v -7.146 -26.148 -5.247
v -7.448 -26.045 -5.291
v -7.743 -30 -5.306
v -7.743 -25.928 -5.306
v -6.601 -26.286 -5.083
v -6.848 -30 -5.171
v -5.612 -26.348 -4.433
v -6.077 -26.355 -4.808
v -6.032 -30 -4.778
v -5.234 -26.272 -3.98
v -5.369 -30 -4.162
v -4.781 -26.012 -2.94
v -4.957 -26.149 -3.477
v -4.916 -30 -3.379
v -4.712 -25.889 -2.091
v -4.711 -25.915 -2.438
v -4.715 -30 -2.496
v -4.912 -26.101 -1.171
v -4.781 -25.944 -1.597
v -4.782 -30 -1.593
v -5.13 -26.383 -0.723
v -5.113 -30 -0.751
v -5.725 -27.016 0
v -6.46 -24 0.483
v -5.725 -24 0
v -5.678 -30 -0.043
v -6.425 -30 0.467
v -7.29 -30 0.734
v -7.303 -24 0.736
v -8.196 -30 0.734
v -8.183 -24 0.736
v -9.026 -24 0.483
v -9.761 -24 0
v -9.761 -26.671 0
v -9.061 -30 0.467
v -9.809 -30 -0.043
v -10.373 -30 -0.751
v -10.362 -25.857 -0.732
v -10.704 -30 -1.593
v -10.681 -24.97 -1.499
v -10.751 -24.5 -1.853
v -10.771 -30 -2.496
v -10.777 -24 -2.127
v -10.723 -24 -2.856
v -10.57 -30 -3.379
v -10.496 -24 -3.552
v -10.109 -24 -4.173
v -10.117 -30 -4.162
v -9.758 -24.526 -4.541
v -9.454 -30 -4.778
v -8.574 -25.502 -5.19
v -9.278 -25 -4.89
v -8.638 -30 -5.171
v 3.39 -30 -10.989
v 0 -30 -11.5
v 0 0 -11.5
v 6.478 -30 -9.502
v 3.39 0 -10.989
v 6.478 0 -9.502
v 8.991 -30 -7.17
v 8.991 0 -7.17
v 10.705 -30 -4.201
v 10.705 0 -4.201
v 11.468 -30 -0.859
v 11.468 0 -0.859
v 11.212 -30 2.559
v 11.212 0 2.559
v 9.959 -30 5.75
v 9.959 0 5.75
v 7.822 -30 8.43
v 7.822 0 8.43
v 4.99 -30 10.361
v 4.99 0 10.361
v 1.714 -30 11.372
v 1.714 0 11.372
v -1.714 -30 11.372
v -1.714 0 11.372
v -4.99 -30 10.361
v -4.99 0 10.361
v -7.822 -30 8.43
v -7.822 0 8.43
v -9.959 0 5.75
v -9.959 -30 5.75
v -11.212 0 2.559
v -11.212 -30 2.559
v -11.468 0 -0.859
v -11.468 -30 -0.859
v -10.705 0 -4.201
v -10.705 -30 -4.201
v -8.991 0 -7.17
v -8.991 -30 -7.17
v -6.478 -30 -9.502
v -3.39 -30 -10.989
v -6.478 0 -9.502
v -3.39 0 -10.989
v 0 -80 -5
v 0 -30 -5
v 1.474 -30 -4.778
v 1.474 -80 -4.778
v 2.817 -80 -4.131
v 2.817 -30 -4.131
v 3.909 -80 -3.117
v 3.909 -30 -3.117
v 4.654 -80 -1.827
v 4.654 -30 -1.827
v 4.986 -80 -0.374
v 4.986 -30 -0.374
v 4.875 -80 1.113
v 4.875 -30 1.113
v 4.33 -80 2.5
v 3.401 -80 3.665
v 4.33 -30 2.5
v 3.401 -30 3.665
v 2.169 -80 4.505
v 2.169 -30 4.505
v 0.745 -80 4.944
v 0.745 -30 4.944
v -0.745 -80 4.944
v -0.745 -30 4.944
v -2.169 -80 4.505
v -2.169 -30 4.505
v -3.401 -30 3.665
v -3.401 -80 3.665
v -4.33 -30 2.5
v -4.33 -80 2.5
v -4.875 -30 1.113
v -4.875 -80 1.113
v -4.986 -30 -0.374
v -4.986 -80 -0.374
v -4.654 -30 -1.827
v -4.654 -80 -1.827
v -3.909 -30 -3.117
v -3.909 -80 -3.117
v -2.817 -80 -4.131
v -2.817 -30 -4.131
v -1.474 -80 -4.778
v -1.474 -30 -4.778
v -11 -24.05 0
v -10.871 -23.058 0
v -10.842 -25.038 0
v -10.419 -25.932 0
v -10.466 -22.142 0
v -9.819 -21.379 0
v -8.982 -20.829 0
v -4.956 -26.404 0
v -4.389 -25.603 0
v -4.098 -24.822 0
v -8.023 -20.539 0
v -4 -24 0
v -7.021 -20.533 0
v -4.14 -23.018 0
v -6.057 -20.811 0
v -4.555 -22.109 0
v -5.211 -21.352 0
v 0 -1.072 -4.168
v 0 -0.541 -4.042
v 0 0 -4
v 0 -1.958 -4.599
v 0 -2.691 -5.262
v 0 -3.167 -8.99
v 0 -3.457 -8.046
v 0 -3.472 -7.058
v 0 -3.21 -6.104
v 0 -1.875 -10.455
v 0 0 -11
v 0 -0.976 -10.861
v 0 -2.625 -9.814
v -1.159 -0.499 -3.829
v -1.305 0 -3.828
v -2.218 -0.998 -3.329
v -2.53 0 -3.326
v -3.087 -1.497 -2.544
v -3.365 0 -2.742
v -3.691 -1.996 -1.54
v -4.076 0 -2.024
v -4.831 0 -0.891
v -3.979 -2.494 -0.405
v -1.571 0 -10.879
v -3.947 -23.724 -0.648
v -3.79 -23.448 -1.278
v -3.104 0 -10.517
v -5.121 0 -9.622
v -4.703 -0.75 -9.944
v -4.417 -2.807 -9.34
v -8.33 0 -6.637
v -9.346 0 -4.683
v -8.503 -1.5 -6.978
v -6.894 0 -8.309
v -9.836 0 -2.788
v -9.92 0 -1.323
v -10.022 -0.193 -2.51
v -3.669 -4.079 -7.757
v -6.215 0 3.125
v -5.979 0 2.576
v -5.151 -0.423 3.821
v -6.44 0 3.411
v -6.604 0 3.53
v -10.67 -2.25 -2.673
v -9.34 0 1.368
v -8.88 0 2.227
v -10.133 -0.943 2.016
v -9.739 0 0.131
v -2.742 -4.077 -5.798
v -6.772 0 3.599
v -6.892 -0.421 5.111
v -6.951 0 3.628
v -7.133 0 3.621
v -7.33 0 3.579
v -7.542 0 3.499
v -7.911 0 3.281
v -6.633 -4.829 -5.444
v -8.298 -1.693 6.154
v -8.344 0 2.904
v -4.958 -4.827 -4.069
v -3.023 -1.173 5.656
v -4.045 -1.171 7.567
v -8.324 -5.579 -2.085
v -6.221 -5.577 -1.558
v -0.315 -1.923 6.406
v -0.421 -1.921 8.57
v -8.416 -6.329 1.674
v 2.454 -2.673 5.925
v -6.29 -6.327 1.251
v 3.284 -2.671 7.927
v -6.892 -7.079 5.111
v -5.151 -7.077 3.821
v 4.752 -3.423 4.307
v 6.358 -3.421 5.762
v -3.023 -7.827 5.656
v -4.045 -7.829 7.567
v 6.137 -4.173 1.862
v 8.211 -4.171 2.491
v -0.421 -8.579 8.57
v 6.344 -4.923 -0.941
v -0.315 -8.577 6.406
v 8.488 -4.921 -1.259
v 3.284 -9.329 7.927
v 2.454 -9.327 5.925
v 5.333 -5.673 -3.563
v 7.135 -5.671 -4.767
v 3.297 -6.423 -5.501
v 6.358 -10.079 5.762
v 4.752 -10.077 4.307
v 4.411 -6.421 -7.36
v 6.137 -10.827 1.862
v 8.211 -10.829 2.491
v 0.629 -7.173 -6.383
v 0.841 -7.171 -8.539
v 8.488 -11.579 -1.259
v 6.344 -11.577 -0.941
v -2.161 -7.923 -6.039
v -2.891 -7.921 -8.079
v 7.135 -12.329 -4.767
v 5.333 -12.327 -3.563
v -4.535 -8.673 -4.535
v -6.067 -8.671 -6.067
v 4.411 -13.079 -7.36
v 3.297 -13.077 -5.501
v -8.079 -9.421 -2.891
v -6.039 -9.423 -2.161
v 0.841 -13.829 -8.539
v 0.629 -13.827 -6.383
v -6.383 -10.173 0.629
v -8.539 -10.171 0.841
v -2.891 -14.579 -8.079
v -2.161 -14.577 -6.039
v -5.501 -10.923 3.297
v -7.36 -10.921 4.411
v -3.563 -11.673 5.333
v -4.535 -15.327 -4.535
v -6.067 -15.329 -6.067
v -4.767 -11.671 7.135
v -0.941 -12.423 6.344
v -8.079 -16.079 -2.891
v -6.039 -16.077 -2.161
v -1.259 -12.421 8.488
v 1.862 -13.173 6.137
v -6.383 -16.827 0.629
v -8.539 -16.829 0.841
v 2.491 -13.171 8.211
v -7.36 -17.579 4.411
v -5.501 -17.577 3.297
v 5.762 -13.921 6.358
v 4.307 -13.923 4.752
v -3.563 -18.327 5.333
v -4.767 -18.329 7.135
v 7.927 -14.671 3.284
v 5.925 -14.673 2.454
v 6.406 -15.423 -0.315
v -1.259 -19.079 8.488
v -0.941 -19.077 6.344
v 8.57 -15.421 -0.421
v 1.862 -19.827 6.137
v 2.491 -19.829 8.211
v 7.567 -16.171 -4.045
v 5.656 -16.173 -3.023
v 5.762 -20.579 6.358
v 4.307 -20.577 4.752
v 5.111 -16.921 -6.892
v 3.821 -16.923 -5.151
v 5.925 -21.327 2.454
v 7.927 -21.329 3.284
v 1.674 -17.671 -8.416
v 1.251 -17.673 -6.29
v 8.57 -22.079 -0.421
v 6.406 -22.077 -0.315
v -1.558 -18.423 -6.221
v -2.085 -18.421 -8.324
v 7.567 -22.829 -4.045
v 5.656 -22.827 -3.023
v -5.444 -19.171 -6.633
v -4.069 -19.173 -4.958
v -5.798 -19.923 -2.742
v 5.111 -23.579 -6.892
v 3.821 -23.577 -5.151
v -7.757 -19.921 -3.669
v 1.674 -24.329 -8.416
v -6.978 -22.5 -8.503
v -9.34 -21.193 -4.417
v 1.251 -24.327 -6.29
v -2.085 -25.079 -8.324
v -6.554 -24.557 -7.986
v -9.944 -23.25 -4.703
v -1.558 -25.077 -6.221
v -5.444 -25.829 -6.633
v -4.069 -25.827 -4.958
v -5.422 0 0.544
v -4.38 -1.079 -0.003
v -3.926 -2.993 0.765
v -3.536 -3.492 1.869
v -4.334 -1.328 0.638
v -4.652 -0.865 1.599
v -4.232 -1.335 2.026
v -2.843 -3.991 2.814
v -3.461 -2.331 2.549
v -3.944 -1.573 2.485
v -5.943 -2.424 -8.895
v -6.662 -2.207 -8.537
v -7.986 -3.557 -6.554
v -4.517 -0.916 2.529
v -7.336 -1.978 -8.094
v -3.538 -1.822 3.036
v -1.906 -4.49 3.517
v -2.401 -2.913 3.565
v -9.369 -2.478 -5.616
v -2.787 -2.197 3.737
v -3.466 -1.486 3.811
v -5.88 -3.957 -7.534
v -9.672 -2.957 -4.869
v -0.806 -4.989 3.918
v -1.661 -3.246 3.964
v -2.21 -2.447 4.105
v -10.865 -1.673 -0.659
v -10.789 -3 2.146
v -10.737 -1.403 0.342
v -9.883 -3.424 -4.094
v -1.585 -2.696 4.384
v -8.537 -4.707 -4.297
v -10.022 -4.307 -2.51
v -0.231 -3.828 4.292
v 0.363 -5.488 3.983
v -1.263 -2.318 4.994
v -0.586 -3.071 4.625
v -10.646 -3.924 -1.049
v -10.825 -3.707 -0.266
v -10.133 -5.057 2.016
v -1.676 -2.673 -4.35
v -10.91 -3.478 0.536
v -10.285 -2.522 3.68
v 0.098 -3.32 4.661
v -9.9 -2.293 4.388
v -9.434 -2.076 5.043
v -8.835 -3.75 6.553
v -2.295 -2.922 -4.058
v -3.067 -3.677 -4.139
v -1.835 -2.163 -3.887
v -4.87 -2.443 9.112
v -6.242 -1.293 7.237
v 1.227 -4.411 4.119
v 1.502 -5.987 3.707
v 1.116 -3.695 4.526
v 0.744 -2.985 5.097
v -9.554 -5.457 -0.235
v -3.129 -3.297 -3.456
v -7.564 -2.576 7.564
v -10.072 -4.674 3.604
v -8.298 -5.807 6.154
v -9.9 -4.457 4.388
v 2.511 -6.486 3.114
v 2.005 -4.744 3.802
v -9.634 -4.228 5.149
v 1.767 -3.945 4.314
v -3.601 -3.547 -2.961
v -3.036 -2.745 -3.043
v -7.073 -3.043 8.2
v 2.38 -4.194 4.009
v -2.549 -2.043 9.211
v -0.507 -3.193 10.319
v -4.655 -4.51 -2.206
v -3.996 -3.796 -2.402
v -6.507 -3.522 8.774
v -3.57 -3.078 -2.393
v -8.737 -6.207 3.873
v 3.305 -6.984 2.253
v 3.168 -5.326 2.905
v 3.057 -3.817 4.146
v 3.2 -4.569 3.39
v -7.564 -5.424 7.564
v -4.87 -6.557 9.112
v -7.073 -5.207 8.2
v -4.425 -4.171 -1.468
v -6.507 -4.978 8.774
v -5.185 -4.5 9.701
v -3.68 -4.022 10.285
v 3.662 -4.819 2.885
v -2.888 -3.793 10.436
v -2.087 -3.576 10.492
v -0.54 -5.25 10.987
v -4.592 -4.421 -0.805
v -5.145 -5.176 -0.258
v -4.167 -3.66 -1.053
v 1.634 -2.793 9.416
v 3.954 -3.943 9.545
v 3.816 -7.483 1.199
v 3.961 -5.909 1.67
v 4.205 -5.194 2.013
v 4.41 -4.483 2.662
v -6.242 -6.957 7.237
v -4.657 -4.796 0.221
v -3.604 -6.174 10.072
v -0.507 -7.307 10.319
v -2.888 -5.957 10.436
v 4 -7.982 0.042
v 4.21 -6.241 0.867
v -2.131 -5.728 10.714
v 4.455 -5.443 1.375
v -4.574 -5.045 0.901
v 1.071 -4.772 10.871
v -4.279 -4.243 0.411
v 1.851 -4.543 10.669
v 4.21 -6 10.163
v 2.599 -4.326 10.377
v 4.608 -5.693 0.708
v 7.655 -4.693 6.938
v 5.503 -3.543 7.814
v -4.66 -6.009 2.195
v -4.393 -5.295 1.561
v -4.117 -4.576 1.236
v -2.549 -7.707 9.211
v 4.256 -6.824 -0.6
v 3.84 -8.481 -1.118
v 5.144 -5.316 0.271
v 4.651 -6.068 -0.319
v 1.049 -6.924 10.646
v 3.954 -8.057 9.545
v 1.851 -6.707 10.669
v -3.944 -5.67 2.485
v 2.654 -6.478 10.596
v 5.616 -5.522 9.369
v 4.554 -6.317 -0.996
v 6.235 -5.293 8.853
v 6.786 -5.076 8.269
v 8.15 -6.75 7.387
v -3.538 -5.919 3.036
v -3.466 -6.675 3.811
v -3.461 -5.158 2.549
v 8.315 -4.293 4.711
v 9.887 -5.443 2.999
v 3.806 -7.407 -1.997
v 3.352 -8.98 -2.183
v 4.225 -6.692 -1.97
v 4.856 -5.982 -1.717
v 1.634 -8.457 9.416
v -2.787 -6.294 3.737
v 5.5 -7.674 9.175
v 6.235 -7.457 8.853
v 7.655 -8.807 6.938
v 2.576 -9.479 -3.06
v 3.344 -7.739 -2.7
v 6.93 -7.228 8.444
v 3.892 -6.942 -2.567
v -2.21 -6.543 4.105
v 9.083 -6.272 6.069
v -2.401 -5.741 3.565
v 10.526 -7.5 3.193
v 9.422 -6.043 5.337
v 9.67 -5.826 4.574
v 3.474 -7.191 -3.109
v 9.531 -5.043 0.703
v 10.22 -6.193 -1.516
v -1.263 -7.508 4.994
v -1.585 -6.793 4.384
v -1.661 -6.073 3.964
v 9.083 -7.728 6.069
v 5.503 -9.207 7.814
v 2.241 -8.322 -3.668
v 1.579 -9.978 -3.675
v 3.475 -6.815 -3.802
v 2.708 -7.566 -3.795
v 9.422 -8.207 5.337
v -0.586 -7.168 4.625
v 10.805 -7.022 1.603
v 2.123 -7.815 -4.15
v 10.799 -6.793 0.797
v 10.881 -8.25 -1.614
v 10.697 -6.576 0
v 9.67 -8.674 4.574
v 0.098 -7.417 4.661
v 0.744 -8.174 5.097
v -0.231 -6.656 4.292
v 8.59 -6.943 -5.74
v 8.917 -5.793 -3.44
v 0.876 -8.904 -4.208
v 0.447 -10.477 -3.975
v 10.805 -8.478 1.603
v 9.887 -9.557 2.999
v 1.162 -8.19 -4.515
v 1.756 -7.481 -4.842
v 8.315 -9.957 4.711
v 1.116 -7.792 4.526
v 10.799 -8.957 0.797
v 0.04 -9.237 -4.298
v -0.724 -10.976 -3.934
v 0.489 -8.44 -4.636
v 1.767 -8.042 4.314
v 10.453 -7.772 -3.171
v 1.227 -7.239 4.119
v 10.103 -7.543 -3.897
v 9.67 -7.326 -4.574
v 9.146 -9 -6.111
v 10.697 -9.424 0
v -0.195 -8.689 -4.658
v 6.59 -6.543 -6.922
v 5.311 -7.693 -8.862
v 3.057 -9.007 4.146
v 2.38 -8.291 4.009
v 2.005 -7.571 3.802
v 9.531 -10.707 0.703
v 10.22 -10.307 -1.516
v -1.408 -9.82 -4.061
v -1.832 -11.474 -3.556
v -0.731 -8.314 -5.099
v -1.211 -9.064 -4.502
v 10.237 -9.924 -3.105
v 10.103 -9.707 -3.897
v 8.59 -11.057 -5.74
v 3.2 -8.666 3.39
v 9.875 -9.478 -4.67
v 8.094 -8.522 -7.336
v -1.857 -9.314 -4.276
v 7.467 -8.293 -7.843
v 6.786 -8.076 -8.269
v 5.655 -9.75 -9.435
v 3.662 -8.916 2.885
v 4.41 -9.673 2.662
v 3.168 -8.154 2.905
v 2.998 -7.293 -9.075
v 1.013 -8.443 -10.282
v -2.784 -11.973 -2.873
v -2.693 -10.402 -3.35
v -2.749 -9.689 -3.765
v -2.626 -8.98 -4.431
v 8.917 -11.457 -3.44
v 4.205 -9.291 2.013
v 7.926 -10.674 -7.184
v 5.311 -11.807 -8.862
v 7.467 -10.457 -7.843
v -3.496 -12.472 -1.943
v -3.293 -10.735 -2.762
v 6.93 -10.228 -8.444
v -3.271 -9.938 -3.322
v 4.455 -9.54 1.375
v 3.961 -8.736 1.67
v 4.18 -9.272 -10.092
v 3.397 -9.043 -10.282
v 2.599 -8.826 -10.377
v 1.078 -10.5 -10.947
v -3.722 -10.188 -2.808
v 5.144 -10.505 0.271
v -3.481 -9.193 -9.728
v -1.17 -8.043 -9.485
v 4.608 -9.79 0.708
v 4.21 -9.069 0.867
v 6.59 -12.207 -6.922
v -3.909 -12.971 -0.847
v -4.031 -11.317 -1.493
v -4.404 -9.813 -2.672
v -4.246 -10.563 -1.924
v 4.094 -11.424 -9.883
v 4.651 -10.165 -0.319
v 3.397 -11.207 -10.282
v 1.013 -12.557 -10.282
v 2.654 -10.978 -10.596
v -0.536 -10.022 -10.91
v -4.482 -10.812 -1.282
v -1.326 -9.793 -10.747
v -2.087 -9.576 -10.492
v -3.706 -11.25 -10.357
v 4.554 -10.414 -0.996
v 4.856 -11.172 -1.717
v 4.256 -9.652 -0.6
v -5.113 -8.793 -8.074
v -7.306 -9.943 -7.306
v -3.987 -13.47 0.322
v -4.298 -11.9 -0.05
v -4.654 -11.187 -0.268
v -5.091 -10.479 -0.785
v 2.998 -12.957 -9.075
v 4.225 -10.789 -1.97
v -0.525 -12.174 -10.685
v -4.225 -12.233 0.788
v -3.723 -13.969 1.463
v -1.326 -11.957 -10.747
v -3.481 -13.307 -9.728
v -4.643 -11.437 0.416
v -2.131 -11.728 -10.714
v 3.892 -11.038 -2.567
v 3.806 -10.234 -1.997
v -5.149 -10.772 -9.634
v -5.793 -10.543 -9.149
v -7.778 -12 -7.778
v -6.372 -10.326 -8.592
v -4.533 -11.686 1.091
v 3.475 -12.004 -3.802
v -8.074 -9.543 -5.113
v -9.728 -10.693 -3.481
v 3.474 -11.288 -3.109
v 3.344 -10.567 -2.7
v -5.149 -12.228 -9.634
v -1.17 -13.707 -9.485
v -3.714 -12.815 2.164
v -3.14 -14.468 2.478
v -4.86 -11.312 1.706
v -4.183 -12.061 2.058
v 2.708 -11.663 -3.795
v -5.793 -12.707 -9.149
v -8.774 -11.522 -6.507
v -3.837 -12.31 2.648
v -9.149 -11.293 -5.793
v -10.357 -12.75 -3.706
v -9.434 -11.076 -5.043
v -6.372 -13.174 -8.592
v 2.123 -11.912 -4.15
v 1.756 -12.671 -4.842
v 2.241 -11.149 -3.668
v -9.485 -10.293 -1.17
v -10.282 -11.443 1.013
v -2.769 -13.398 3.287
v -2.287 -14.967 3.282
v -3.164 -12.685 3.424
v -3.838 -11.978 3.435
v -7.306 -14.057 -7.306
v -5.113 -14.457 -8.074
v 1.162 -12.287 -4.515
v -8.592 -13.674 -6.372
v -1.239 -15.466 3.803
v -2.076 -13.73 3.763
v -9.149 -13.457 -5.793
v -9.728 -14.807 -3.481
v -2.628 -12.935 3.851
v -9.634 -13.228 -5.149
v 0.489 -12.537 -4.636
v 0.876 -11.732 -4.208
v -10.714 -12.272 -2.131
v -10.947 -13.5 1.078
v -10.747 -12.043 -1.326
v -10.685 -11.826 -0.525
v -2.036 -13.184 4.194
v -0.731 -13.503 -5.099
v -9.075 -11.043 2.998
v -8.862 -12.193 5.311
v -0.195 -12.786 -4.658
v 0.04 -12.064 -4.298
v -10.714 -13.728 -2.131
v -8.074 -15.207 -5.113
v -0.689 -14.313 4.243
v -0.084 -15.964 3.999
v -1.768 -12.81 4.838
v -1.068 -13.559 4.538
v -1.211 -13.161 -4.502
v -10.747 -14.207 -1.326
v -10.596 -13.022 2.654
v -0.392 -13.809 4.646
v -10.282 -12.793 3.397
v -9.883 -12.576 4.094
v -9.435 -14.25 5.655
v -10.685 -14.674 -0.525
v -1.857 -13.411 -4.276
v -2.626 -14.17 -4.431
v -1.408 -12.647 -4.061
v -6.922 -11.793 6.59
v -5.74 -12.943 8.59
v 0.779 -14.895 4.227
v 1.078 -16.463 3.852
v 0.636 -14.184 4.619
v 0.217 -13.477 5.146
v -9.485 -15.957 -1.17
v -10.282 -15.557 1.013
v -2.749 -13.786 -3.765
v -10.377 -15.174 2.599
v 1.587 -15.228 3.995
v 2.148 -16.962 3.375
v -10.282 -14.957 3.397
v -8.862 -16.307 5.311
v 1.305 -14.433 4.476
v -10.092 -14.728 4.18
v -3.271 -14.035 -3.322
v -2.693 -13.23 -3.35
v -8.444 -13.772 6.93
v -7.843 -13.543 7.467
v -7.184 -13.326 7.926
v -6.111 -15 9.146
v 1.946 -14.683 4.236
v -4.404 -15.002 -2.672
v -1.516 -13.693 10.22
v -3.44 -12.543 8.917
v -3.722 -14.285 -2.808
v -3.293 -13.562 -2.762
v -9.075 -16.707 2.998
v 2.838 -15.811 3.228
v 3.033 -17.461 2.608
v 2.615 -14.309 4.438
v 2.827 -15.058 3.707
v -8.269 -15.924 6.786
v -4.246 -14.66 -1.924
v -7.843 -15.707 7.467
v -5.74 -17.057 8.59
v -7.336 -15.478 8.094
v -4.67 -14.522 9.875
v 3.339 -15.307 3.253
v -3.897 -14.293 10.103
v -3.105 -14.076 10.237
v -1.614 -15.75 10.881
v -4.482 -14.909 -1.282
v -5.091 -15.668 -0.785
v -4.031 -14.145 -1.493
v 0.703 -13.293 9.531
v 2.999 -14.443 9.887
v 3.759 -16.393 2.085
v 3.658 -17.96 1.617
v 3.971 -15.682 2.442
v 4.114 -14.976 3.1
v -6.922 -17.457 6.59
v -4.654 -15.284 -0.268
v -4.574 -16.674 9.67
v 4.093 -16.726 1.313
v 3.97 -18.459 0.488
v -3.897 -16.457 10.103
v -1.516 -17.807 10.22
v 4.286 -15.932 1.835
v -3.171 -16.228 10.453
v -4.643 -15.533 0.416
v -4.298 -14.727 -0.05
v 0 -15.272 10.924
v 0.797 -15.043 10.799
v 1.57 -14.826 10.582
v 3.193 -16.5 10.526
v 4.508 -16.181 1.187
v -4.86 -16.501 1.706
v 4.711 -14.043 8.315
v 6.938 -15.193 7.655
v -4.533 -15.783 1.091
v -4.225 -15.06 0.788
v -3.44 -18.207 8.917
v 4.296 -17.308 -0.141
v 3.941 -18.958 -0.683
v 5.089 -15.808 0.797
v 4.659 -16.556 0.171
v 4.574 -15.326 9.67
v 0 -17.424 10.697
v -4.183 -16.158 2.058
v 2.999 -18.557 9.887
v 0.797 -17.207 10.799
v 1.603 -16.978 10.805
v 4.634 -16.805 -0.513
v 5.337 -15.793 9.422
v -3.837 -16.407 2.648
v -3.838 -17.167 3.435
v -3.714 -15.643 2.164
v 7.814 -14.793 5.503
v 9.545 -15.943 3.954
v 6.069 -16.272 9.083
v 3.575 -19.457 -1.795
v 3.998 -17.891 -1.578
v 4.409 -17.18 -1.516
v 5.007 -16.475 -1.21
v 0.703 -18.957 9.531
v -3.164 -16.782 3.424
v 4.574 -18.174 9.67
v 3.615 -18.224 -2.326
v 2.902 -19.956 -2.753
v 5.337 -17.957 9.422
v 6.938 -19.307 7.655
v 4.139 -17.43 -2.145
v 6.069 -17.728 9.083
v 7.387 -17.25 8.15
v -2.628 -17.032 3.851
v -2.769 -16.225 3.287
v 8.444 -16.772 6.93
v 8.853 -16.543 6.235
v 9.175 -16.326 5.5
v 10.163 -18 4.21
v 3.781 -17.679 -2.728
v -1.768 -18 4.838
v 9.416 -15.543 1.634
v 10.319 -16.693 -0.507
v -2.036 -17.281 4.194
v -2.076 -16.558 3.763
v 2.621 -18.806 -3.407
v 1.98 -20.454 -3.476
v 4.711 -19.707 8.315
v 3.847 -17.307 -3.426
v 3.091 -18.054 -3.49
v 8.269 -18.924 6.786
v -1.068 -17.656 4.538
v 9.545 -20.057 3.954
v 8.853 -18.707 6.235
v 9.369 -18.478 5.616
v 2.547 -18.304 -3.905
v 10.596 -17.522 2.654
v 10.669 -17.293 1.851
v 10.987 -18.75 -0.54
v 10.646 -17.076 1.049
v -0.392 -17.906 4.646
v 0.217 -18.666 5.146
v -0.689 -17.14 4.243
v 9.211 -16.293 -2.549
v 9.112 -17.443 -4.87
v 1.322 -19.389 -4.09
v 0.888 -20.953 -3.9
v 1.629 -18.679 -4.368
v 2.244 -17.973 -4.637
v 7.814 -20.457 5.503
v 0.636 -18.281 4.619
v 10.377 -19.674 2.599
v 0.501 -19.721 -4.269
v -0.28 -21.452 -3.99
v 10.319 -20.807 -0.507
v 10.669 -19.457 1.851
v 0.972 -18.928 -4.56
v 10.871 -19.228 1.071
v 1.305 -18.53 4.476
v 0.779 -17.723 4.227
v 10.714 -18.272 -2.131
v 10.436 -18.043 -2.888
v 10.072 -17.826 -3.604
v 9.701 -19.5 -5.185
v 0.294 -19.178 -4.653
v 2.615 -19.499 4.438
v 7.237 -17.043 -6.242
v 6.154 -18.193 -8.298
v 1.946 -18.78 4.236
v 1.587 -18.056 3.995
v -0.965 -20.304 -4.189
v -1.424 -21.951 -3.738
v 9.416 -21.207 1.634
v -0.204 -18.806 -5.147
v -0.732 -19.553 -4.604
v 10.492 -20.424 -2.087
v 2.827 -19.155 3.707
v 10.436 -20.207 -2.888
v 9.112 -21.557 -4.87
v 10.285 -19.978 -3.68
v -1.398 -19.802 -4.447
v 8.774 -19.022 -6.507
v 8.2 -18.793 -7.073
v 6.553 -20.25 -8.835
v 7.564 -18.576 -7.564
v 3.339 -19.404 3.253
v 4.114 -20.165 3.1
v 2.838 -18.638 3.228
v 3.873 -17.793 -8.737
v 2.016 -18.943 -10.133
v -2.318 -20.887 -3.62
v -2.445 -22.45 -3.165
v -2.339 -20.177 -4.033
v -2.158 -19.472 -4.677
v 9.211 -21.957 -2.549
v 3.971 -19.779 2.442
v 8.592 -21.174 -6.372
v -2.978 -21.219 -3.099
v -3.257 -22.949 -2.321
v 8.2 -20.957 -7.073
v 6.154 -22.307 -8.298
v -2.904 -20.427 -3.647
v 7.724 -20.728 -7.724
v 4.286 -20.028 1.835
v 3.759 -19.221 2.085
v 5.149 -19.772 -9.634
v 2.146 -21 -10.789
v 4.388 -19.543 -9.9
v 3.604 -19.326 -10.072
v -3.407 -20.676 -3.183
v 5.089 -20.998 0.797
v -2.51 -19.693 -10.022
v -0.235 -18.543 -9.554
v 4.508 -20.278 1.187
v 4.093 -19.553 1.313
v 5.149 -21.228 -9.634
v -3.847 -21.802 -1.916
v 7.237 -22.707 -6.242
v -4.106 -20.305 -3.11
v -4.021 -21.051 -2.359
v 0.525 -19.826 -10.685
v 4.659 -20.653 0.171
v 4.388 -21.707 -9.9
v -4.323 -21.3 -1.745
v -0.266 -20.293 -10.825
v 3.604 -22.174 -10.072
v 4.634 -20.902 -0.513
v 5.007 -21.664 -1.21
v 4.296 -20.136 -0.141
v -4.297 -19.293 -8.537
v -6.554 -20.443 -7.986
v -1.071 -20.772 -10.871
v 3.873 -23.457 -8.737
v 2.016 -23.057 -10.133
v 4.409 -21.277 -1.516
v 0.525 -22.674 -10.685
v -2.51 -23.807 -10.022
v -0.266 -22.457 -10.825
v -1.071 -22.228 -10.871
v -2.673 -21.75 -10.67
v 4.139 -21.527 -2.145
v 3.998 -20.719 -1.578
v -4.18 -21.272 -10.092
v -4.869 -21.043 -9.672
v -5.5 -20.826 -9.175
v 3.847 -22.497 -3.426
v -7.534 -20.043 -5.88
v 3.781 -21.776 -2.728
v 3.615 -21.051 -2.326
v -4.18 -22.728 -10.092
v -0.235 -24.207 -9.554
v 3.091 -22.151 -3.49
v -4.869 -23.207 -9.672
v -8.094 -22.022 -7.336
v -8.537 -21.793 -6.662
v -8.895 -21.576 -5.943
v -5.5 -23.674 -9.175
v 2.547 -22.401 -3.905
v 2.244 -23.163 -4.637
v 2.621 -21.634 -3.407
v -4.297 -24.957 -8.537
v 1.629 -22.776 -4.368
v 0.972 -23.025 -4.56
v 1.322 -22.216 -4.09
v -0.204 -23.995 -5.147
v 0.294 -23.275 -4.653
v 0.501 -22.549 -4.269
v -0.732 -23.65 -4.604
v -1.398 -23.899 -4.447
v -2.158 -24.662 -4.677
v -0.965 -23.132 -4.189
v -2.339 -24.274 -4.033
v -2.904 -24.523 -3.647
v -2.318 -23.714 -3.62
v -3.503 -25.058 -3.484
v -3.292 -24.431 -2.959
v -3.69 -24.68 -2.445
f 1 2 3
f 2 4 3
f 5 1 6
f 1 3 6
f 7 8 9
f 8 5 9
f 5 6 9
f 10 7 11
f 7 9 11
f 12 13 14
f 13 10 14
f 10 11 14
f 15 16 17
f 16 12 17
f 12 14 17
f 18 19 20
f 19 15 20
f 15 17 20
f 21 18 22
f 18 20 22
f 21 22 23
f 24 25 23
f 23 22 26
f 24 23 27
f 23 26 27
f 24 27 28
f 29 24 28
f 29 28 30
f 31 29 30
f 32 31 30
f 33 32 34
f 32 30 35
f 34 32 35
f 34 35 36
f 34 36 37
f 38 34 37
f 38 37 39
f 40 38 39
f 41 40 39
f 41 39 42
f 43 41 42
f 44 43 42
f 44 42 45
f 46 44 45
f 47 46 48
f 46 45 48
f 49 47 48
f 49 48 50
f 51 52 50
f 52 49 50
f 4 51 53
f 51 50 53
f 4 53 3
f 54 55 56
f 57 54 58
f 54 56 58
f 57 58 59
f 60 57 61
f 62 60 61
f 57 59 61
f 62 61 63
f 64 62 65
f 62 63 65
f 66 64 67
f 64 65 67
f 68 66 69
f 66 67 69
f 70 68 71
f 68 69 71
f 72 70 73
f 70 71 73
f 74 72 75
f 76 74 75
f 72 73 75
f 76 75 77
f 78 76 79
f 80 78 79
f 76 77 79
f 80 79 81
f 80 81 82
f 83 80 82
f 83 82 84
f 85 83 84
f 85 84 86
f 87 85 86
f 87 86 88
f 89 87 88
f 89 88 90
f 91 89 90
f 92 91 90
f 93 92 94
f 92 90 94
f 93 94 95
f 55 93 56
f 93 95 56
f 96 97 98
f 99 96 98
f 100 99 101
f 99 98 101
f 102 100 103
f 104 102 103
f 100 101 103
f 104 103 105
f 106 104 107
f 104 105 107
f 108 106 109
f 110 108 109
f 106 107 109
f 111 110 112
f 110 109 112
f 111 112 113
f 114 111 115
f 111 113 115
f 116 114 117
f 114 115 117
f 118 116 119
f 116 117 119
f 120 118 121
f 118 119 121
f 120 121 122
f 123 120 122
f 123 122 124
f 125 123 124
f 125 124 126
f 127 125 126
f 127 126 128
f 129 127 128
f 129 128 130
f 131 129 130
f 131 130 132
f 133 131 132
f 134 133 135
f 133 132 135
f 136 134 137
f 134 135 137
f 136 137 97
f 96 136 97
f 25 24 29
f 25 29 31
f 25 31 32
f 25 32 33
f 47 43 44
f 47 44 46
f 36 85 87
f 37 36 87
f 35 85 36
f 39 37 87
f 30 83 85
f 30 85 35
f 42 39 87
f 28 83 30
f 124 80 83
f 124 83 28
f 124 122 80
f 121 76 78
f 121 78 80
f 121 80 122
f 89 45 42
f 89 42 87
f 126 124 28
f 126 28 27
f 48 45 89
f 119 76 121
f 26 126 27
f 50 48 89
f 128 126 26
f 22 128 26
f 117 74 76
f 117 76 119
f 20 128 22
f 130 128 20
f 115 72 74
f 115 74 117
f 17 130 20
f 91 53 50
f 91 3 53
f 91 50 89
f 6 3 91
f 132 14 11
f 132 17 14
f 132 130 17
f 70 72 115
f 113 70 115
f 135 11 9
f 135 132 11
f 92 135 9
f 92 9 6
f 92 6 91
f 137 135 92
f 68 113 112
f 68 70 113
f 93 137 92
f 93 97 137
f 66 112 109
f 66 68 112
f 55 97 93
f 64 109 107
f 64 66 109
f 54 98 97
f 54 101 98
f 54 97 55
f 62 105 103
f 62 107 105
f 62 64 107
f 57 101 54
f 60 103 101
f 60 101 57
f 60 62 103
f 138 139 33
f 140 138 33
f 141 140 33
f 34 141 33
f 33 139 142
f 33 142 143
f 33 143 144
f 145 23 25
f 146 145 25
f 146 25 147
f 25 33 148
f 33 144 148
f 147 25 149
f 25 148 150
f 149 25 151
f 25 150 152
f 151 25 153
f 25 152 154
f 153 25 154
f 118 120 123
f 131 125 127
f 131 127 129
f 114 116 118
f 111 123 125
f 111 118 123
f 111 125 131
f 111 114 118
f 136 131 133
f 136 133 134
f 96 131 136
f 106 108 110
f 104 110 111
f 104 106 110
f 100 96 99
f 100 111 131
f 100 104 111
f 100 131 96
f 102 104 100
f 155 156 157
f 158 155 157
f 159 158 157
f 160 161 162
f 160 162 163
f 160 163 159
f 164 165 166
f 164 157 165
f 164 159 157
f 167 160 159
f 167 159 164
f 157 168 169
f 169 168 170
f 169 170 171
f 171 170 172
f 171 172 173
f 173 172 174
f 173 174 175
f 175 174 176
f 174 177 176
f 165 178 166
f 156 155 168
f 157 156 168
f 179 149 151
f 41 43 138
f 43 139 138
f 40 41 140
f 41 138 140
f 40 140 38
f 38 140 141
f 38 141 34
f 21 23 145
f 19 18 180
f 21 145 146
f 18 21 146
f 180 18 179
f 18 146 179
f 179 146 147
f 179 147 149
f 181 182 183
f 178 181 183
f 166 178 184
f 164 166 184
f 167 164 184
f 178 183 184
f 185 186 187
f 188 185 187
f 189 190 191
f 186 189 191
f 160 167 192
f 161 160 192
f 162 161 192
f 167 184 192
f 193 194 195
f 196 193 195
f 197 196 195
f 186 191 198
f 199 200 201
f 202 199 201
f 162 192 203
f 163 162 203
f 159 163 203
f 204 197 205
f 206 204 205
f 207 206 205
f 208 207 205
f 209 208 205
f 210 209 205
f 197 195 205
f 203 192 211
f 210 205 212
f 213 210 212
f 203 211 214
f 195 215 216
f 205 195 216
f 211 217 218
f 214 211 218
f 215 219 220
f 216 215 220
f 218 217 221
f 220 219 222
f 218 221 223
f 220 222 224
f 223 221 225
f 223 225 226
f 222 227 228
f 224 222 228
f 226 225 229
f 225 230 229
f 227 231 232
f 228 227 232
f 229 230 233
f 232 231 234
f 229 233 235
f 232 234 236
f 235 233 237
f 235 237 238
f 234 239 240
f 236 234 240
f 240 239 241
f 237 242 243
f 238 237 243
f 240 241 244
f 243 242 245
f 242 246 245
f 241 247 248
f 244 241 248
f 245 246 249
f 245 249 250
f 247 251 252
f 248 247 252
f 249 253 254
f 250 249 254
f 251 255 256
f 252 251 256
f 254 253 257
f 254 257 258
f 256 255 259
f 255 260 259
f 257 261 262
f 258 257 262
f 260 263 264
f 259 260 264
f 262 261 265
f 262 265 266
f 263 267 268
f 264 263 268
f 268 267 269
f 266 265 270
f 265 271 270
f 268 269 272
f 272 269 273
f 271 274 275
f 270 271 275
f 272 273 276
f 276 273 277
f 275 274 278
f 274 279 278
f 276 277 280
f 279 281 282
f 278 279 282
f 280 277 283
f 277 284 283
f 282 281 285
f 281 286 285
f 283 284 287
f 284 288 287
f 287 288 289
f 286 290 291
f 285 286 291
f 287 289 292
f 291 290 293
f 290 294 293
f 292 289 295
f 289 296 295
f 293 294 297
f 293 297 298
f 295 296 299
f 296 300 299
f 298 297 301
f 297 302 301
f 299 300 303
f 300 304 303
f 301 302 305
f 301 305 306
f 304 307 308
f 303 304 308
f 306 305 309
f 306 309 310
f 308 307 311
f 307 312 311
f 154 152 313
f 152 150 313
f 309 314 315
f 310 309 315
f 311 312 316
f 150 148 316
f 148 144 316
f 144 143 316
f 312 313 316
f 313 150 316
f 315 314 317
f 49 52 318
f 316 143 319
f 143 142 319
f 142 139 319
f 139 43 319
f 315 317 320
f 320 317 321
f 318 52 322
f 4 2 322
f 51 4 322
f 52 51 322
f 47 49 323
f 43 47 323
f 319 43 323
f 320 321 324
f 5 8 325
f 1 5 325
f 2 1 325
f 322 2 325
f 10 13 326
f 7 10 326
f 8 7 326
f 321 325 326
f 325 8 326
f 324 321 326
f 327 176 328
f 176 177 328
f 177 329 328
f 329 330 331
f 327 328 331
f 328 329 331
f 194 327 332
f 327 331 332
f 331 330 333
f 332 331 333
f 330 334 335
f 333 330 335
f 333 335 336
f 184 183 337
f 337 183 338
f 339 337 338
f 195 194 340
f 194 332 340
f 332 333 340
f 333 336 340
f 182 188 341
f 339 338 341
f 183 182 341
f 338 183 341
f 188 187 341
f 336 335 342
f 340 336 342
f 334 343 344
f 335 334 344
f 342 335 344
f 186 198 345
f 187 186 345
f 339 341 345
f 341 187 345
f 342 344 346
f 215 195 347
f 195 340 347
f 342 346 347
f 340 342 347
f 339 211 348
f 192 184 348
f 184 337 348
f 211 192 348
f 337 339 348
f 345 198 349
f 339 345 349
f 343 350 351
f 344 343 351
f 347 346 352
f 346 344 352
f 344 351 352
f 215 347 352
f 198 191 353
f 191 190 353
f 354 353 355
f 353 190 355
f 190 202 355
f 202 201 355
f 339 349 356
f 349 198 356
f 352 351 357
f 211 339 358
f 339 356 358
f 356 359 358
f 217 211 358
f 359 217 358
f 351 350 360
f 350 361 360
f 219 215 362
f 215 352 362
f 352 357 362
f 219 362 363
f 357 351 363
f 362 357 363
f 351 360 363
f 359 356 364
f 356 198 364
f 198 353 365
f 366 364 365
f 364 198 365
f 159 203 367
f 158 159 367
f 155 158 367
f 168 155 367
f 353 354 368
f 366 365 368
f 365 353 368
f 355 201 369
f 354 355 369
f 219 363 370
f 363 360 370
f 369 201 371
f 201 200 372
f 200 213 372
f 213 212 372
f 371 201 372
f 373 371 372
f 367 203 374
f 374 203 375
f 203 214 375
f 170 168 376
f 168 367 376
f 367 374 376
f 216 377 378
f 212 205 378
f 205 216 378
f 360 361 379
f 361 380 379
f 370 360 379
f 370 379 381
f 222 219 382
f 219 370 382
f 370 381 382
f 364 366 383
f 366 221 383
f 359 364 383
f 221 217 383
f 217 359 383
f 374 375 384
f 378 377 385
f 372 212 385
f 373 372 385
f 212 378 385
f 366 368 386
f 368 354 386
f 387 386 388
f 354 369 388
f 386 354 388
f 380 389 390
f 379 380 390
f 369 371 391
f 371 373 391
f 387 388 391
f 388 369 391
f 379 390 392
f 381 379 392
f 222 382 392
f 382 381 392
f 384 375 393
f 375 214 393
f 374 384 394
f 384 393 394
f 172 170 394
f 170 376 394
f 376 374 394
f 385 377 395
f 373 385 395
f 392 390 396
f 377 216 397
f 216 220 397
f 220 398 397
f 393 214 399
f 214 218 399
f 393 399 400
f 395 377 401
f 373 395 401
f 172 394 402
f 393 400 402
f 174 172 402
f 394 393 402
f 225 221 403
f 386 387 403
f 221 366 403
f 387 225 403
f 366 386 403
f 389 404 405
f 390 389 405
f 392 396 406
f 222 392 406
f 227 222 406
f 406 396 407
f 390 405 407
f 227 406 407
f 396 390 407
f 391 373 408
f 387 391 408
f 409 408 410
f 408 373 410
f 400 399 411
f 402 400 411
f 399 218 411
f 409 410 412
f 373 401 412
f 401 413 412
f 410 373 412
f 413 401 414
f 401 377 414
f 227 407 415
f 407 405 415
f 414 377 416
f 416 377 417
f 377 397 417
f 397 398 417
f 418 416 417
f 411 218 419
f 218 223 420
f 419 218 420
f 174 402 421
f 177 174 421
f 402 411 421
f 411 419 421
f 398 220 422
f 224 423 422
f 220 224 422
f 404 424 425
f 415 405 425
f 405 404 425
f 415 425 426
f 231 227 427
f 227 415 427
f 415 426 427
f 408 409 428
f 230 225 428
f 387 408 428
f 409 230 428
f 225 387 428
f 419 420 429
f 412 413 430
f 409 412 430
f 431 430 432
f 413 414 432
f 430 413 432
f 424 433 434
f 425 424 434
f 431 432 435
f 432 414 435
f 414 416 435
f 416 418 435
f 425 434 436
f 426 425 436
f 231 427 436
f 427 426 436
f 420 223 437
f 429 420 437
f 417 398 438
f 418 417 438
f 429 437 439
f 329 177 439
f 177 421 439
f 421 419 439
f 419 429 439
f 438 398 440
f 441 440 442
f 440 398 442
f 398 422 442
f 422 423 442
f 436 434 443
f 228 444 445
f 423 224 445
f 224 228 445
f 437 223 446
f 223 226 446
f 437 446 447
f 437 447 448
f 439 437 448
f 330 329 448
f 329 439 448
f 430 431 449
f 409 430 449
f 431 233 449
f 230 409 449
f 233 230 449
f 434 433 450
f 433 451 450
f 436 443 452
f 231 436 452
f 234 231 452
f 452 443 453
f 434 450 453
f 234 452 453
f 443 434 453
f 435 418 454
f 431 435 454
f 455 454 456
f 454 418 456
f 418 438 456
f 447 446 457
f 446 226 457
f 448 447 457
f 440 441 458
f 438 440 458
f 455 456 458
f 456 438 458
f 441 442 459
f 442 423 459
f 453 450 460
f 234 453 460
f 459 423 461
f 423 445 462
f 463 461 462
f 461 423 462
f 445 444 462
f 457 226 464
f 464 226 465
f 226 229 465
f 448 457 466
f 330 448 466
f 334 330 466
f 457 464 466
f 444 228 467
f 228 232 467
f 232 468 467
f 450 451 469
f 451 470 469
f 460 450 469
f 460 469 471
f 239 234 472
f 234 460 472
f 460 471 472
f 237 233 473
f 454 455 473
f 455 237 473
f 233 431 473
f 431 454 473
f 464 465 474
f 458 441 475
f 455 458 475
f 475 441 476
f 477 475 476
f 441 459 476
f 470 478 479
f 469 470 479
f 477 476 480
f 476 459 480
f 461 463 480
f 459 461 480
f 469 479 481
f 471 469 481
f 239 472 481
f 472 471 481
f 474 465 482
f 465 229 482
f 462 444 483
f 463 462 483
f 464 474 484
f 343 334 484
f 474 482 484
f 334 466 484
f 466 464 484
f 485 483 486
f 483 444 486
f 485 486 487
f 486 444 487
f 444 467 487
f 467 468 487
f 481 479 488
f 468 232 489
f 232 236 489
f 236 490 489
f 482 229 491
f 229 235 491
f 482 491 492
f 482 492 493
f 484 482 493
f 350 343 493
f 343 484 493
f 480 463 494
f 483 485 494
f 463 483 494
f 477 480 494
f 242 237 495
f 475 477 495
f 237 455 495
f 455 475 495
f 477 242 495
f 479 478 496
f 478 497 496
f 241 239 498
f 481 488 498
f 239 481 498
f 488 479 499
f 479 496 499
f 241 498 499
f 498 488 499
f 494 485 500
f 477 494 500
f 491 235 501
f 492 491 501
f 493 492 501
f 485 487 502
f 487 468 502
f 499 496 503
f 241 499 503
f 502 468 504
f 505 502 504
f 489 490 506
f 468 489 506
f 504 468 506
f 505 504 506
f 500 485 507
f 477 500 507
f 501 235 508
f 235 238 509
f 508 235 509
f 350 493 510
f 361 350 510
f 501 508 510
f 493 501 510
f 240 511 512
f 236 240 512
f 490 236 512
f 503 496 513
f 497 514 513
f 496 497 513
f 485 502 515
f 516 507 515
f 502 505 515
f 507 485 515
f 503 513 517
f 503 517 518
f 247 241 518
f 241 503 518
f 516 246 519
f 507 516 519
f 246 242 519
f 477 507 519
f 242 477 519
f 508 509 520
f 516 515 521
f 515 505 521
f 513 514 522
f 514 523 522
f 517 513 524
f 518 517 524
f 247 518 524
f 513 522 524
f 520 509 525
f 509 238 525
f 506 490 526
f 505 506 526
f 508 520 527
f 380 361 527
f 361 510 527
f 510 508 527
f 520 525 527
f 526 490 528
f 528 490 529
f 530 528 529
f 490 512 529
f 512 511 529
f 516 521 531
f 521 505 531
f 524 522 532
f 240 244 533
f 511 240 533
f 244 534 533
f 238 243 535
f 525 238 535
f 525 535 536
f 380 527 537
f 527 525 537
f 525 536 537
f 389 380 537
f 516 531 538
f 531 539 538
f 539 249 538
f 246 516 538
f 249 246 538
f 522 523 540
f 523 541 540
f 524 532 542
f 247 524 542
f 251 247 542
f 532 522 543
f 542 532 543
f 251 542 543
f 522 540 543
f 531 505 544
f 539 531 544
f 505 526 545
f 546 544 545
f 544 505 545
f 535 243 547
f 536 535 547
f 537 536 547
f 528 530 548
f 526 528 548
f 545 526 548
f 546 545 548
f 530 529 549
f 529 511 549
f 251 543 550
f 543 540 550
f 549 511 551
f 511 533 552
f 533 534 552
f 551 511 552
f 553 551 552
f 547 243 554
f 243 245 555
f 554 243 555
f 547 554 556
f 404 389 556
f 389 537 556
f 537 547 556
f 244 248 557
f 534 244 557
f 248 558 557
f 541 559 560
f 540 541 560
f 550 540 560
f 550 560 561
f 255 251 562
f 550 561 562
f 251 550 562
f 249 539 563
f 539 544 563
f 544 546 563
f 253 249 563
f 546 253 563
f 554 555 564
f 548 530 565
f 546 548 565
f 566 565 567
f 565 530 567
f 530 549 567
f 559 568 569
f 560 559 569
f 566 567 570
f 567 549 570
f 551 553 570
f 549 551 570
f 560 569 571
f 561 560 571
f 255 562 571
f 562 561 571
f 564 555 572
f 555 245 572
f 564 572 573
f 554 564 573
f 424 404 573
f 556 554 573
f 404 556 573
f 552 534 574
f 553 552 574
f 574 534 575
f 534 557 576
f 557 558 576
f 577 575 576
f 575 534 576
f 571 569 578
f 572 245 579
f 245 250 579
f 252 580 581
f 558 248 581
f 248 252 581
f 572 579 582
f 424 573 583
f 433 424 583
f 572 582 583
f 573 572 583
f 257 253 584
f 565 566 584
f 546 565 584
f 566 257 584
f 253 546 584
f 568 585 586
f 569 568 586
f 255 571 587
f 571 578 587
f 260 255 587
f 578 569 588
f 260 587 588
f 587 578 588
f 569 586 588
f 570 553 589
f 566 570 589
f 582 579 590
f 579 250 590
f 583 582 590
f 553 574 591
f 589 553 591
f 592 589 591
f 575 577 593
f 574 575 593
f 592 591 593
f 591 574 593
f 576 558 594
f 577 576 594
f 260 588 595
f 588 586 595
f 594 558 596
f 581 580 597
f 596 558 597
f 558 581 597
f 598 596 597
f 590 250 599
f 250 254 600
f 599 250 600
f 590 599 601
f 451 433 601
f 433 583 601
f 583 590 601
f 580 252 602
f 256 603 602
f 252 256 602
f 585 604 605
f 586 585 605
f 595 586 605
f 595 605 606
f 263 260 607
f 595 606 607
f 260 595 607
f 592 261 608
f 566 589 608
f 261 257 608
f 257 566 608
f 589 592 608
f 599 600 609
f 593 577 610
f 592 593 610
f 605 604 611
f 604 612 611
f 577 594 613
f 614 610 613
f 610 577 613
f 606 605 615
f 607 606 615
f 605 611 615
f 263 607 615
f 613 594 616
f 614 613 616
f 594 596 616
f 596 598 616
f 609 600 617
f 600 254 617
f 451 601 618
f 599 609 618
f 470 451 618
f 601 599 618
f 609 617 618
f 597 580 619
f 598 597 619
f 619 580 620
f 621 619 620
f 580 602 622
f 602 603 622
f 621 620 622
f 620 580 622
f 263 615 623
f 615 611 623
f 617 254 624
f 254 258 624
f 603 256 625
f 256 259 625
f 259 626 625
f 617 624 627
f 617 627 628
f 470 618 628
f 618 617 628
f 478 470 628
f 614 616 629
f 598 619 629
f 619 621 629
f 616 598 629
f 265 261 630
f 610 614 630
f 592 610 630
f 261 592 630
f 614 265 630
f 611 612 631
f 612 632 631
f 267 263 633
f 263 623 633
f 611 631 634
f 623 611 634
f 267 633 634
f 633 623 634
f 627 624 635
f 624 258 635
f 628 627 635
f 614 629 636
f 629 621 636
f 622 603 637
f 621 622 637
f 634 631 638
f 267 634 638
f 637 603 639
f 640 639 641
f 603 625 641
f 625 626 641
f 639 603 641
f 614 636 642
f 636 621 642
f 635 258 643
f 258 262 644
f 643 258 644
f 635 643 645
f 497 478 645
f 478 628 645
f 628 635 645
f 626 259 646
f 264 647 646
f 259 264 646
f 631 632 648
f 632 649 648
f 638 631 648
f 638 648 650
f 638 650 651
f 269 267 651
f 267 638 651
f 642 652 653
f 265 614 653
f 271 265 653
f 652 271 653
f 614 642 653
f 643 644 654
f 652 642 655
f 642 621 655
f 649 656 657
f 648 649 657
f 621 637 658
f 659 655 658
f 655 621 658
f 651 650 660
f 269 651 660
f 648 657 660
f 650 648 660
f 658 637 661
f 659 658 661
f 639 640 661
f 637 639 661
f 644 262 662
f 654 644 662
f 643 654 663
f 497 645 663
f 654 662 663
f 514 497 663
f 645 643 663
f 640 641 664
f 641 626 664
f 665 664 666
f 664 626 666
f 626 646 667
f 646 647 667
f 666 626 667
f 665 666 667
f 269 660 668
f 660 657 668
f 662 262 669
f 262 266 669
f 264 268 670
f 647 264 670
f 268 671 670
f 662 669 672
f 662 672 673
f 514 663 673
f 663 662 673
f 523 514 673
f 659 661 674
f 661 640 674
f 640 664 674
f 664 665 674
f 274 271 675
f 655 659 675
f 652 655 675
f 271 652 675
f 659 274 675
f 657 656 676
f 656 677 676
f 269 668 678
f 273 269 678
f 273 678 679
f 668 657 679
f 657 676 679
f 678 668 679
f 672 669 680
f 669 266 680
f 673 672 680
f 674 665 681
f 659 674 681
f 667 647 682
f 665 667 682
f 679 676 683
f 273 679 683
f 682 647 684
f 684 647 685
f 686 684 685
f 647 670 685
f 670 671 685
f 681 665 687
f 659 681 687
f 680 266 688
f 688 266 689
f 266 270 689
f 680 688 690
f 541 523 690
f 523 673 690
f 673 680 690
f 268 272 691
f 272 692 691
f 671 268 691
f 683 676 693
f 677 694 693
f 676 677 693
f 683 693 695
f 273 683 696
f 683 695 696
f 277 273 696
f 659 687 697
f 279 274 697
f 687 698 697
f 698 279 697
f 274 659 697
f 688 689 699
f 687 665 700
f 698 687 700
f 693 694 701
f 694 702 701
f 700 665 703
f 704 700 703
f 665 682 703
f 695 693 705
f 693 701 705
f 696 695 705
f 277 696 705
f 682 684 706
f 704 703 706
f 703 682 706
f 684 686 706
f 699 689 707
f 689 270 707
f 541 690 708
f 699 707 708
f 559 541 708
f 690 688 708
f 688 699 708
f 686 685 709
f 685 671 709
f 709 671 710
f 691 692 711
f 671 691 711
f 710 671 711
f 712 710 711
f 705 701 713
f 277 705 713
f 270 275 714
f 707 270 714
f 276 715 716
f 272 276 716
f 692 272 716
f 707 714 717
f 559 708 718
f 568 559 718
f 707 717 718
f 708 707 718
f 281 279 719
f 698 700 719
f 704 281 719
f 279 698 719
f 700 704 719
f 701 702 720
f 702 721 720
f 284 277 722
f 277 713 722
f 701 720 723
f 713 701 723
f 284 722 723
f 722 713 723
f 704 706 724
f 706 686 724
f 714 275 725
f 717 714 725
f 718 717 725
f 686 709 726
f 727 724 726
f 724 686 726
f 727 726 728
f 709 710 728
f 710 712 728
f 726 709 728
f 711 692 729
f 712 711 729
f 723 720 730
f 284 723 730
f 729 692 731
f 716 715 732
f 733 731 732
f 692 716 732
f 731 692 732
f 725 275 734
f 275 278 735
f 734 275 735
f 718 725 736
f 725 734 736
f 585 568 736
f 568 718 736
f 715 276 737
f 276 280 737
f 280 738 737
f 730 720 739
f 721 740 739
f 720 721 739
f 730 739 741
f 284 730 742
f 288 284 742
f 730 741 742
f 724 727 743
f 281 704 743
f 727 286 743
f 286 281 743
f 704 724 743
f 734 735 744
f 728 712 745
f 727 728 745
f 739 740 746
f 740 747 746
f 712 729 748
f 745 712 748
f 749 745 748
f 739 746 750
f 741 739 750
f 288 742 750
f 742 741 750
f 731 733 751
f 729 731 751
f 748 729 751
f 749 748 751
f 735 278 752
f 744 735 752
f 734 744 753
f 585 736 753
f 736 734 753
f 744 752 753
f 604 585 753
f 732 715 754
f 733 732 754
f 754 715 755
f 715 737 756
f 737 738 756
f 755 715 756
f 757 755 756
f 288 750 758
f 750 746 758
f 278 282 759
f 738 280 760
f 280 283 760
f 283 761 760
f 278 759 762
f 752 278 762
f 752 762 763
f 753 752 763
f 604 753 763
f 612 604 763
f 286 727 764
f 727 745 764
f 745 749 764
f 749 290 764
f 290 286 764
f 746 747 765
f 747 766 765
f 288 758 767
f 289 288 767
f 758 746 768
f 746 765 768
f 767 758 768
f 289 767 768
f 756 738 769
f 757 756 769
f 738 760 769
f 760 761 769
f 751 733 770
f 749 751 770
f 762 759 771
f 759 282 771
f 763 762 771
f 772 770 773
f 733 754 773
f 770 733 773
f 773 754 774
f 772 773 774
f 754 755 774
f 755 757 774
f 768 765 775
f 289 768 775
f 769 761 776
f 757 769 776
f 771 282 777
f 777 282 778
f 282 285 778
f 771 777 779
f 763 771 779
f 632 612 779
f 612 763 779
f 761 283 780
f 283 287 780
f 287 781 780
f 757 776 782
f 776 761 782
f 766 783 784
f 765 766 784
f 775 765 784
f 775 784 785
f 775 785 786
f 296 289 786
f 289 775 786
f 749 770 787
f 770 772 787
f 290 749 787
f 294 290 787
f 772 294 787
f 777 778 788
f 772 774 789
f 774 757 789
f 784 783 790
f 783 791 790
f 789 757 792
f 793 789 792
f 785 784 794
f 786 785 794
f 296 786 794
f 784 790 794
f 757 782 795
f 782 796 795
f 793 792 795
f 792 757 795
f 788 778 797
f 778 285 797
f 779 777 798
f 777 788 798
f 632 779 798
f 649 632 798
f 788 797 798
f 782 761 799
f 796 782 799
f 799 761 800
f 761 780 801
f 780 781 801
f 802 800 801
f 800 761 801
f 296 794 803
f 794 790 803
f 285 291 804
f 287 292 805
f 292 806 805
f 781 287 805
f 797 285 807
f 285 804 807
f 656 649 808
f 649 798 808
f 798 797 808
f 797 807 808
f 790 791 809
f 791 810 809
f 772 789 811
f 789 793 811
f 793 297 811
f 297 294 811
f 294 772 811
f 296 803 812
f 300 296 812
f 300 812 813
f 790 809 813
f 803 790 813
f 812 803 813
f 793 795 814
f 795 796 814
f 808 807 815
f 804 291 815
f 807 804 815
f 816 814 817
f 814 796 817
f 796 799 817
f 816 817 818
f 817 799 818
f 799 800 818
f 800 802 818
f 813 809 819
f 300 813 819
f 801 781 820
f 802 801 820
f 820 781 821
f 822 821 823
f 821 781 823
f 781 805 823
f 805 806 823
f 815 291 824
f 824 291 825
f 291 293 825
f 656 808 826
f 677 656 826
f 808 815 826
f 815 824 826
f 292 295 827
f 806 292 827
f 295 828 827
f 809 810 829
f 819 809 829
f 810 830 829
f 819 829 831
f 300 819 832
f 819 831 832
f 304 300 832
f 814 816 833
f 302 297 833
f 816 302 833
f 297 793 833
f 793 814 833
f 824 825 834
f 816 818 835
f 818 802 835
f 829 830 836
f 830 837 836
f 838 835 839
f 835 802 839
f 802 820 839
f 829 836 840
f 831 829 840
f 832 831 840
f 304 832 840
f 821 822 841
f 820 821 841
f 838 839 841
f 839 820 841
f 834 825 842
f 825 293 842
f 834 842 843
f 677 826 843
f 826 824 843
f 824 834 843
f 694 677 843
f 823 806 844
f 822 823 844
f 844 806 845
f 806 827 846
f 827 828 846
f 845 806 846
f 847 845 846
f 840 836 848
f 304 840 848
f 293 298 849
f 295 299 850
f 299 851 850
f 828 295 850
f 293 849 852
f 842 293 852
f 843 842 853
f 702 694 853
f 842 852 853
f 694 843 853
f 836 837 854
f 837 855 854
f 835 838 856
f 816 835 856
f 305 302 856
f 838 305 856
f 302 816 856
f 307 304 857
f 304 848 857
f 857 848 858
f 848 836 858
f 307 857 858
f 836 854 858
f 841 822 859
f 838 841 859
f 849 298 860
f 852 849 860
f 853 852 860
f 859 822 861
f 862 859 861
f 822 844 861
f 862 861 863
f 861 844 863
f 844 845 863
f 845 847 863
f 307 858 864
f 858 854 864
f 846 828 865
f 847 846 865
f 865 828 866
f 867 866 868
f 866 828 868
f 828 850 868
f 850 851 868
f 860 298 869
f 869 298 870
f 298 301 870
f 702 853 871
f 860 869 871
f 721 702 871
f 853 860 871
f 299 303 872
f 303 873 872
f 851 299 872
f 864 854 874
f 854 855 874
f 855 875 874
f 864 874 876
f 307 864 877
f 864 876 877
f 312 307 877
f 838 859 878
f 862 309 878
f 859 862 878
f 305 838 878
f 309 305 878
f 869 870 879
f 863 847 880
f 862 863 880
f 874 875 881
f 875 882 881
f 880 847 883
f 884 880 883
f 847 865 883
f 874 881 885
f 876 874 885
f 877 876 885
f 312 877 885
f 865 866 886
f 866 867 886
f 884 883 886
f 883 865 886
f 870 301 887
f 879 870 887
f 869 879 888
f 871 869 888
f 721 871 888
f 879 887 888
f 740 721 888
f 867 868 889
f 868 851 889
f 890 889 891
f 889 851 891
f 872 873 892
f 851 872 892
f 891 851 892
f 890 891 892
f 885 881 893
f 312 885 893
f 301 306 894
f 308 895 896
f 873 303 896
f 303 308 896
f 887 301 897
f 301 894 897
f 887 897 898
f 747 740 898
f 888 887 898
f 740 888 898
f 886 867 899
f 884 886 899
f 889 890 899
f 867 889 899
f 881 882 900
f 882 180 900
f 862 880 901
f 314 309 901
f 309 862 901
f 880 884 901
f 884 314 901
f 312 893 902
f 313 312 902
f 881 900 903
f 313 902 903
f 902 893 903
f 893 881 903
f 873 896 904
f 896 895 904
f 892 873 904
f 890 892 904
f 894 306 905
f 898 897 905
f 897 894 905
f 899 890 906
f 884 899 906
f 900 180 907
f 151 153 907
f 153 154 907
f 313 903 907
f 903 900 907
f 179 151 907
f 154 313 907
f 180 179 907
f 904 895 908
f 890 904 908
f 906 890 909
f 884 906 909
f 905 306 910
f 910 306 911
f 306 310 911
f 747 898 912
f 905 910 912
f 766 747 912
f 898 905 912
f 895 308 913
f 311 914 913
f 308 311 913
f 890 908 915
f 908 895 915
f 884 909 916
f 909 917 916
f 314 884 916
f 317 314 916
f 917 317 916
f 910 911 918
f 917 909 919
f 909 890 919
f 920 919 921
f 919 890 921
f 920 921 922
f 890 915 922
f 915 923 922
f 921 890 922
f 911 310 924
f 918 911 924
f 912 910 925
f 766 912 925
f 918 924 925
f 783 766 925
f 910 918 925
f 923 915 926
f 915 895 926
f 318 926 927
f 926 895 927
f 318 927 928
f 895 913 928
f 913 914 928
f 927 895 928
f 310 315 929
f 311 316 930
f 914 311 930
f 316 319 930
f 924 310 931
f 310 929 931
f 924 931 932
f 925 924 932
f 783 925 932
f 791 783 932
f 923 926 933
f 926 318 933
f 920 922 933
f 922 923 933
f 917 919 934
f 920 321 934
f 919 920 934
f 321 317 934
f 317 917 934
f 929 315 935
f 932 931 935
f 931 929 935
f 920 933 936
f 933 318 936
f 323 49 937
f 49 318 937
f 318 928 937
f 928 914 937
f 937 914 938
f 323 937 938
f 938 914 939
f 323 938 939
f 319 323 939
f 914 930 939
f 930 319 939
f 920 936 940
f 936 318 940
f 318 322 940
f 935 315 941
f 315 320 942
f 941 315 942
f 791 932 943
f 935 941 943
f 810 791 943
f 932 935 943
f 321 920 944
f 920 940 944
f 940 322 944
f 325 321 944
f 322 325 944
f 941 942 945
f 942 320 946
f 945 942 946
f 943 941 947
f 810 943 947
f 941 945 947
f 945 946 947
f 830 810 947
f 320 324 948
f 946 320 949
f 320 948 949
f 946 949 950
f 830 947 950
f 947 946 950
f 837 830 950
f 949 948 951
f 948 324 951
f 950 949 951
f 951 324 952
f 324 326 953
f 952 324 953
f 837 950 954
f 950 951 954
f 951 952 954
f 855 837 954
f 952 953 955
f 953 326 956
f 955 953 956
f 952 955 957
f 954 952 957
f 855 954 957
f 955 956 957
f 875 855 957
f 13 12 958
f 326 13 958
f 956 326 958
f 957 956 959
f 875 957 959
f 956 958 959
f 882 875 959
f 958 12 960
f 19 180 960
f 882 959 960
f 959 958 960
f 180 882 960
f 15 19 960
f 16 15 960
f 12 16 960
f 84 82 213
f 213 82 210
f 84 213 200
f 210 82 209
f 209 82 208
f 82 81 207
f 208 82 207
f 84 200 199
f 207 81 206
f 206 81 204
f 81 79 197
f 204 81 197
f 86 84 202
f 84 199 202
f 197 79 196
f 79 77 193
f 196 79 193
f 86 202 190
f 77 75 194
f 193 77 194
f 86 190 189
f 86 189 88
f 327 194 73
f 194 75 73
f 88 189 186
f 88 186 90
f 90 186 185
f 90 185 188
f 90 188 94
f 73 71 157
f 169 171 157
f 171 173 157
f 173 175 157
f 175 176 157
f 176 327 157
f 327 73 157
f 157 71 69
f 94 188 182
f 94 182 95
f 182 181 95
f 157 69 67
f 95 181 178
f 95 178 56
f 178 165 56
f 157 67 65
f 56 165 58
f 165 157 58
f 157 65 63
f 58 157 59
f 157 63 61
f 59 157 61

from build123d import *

# Parameters (mm, degrees)
SKETCH2_R           = 17.5
BOSS_EXTRUDE2_DEPTH = 30
SKETCH3_R           = 11.5
CUT_EXTRUDE1_DEPTH  = 30
CUT_EXTRUDE1_DRAFT  = -5
SKETCH4_R           = 15
SKETCH4_R_2         = 12.5
CUT_EXTRUDE2_DEPTH  = 5
SKETCH8_R           = 11.5
BOSS_EXTRUDE3_DEPTH = 30
SWEEP3_PITCH        = 10.666666667
SWEEP3_HEIGHT       = 24
SWEEP3_RADIUS       = 7.5
SKETCH10_R          = 3.5
SKETCH11_R          = 5
BOSS_EXTRUDE4_DEPTH = 50
SKETCH16_R          = 3.036795298
CUT_EXTRUDE7_DEPTH  = 6


with BuildPart() as part:
    # Sketch2 → Boss-Extrude2 (new body)
    with BuildSketch(Plane(origin=(0, 0, 0), x_dir=(1, 0, 0), z_dir=(0, 1, 0))):
        with Locations(Location((0, 0, 0), (0, 0, 270))):
            Circle(SKETCH2_R)
    extrude(amount=BOSS_EXTRUDE2_DEPTH)


with BuildPart() as cut_extrude1_tool:
    # Sketch3 → Cut-Extrude1 (with draft: the straight prism first)
    with BuildSketch(Plane.XZ):
        Circle(SKETCH3_R)
    extrude(amount=-CUT_EXTRUDE1_DEPTH)
    # Cut-Extrude1: the draft: its side faces are tilted about the plane it starts from
    cut_extrude1_sides = [cut_extrude1_tool.faces().sort_by_distance(p)[0] for p in [
        (-11.5, 15, 0),
    ]]
    draft(cut_extrude1_sides, Plane.XZ, CUT_EXTRUDE1_DRAFT)


with BuildPart() as part_1:
    add(part.part)

    # Cut-Extrude1: cut by cut_extrude1_tool
    add(cut_extrude1_tool.part, mode=Mode.SUBTRACT)

    # Sketch4 → Cut-Extrude2 (cut)
    with BuildSketch(Plane.XZ):
        with Locations(Location((0, 0.439504446, 0), (0, 0, 270))):
            Circle(SKETCH4_R)
        with Locations(Location((0, 0.439504446, 0), (0, 0, 270))):
            Circle(SKETCH4_R_2, mode=Mode.SUBTRACT)
    extrude(amount=-CUT_EXTRUDE2_DEPTH, mode=Mode.SUBTRACT)


with BuildPart() as body_2:
    # Sketch8 → Boss-Extrude3 (new body)
    with BuildSketch(Plane.XZ):
        with Locations(Location((0, 0, 0), (0, 0, 270))):
            Circle(SKETCH8_R)
    extrude(amount=BOSS_EXTRUDE3_DEPTH)


with BuildPart() as body_3:
    # Sweep3: sweep along a helix
    with BuildLine() as sweep3_path:
        Helix(SWEEP3_PITCH, SWEEP3_HEIGHT, SWEEP3_RADIUS, center=(0, 0, 0), direction=(0, -1, 0), lefthand=True)
    # Sketch10 → Sweep3 (sweep)
    with BuildSketch(Plane(origin=(0, 0, 0), x_dir=(0, 0, -1), z_dir=(1, 0, 0))):
        with Locations((-7.5, -16)):
            Circle(SKETCH10_R)
    sweep(path=sweep3_path.line, is_frenet=True)


with BuildPart() as body_2_1:
    add(body_2.part)

    # Combine1: cut body 3
    add(body_3.part, mode=Mode.SUBTRACT)

    # Sketch11 → Boss-Extrude4 (add)
    with BuildSketch(Plane.XZ.offset(30)):
        with Locations(Location((0, 0, 0), (0, 0, 270))):
            Circle(SKETCH11_R)
    extrude(amount=BOSS_EXTRUDE4_DEPTH)

    # Sketch16 → Cut-Extrude7 (cut)
    with BuildSketch(Plane.XZ.offset(30)):
        with Locations(Location((-7.743073418, -2.269070065, 0), (0, 0, 270))):
            Circle(SKETCH16_R)
    extrude(amount=-CUT_EXTRUDE7_DEPTH, mode=Mode.SUBTRACT)


solid = body_2_1.part
